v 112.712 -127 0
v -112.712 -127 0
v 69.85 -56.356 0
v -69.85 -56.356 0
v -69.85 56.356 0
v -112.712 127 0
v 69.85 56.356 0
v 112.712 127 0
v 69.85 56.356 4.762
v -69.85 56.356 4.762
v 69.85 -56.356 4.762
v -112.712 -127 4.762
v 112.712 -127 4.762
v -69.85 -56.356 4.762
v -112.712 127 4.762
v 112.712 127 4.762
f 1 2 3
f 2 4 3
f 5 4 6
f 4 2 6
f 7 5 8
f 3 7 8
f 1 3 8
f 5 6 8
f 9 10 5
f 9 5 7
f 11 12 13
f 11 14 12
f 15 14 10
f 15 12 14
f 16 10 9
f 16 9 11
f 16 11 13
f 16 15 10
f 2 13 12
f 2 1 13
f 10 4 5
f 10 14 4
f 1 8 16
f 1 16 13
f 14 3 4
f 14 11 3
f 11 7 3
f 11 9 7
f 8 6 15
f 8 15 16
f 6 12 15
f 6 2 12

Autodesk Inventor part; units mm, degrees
ref_plane "YZ Plane" through (0, 0, 0) normal (1, 0, 0) x (0, 1, 0)
ref_plane "XZ Plane" through (0, 0, 0) normal (0, 1, 0) x (-1, 0, 0)
ref_plane "XY Plane" through (0, 0, 0) normal (0, 0, 1) x (1, 0, 0)
sketch "Sketch1" plane through (0, 0, 0) normal (0, 0, 1) x (1, 0, 0)
  line L0 (112.7125, -127) -> (-112.7125, -127)
  line L1 (-112.7125, -127) -> (-112.7125, 127)
  line L2 (-112.7125, 127) -> (112.7125, 127)
  line L3 (112.7125, 127) -> (112.7125, -127)
  line L4 (112.7125, -127) -> (-112.7125, 127) construction
  line L5 (-112.7125, -127) -> (112.7125, 127) construction
  point P0 (0, 0)
  dimension "d1" = 225.425
  dimension "d2" = 254
extrude "Plate1" add sketch "Sketch1" along normal blind 4.7625
sketch "Sketch2" plane through (0, 0, 4.7625) normal (0, 0, 1) x (1, 0, 0)
  line L0 (-69.85, 56.3563) -> (69.85, 56.3563)
  line L1 (69.85, 56.3563) -> (69.85, -56.3563)
  line L2 (69.85, -56.3563) -> (-69.85, -56.3563)
  line L3 (-69.85, -56.3563) -> (-69.85, 56.3563)
  line L4 (-69.85, 56.3563) -> (69.85, -56.3563) construction
  line L5 (69.85, 56.3563) -> (-69.85, -56.3563) construction
  point P0 (0, 0)
  dimension "d3" = 139.7
  dimension "d4" = 112.7125
extrude "Cut1" cut sketch "Sketch2" against normal blind 4.7625
equation "\"d5\" = Thickness"
equation "\"BendRadius\" = Thickness"
equation "\"BendReliefWidth\" = Thickness"
equation "\"BendReliefDepth\" = 0.5 * Thickness"
equation "\"CornerReliefSize\" = 4 * Thickness"
equation "\"MinimumRemnant\" = 2 * Thickness"
equation "\"TransitionRadius\" = BendRadius"
equation "\"JacobiRadiusSize\" = BendRadius"
equation "\"GapSize\" = Thickness"
equation "\"d0\" = BendRadius"
equation "\"Thickness\" = 4.7625"
properties part number "LeftSide" material "Steel, Mild"
